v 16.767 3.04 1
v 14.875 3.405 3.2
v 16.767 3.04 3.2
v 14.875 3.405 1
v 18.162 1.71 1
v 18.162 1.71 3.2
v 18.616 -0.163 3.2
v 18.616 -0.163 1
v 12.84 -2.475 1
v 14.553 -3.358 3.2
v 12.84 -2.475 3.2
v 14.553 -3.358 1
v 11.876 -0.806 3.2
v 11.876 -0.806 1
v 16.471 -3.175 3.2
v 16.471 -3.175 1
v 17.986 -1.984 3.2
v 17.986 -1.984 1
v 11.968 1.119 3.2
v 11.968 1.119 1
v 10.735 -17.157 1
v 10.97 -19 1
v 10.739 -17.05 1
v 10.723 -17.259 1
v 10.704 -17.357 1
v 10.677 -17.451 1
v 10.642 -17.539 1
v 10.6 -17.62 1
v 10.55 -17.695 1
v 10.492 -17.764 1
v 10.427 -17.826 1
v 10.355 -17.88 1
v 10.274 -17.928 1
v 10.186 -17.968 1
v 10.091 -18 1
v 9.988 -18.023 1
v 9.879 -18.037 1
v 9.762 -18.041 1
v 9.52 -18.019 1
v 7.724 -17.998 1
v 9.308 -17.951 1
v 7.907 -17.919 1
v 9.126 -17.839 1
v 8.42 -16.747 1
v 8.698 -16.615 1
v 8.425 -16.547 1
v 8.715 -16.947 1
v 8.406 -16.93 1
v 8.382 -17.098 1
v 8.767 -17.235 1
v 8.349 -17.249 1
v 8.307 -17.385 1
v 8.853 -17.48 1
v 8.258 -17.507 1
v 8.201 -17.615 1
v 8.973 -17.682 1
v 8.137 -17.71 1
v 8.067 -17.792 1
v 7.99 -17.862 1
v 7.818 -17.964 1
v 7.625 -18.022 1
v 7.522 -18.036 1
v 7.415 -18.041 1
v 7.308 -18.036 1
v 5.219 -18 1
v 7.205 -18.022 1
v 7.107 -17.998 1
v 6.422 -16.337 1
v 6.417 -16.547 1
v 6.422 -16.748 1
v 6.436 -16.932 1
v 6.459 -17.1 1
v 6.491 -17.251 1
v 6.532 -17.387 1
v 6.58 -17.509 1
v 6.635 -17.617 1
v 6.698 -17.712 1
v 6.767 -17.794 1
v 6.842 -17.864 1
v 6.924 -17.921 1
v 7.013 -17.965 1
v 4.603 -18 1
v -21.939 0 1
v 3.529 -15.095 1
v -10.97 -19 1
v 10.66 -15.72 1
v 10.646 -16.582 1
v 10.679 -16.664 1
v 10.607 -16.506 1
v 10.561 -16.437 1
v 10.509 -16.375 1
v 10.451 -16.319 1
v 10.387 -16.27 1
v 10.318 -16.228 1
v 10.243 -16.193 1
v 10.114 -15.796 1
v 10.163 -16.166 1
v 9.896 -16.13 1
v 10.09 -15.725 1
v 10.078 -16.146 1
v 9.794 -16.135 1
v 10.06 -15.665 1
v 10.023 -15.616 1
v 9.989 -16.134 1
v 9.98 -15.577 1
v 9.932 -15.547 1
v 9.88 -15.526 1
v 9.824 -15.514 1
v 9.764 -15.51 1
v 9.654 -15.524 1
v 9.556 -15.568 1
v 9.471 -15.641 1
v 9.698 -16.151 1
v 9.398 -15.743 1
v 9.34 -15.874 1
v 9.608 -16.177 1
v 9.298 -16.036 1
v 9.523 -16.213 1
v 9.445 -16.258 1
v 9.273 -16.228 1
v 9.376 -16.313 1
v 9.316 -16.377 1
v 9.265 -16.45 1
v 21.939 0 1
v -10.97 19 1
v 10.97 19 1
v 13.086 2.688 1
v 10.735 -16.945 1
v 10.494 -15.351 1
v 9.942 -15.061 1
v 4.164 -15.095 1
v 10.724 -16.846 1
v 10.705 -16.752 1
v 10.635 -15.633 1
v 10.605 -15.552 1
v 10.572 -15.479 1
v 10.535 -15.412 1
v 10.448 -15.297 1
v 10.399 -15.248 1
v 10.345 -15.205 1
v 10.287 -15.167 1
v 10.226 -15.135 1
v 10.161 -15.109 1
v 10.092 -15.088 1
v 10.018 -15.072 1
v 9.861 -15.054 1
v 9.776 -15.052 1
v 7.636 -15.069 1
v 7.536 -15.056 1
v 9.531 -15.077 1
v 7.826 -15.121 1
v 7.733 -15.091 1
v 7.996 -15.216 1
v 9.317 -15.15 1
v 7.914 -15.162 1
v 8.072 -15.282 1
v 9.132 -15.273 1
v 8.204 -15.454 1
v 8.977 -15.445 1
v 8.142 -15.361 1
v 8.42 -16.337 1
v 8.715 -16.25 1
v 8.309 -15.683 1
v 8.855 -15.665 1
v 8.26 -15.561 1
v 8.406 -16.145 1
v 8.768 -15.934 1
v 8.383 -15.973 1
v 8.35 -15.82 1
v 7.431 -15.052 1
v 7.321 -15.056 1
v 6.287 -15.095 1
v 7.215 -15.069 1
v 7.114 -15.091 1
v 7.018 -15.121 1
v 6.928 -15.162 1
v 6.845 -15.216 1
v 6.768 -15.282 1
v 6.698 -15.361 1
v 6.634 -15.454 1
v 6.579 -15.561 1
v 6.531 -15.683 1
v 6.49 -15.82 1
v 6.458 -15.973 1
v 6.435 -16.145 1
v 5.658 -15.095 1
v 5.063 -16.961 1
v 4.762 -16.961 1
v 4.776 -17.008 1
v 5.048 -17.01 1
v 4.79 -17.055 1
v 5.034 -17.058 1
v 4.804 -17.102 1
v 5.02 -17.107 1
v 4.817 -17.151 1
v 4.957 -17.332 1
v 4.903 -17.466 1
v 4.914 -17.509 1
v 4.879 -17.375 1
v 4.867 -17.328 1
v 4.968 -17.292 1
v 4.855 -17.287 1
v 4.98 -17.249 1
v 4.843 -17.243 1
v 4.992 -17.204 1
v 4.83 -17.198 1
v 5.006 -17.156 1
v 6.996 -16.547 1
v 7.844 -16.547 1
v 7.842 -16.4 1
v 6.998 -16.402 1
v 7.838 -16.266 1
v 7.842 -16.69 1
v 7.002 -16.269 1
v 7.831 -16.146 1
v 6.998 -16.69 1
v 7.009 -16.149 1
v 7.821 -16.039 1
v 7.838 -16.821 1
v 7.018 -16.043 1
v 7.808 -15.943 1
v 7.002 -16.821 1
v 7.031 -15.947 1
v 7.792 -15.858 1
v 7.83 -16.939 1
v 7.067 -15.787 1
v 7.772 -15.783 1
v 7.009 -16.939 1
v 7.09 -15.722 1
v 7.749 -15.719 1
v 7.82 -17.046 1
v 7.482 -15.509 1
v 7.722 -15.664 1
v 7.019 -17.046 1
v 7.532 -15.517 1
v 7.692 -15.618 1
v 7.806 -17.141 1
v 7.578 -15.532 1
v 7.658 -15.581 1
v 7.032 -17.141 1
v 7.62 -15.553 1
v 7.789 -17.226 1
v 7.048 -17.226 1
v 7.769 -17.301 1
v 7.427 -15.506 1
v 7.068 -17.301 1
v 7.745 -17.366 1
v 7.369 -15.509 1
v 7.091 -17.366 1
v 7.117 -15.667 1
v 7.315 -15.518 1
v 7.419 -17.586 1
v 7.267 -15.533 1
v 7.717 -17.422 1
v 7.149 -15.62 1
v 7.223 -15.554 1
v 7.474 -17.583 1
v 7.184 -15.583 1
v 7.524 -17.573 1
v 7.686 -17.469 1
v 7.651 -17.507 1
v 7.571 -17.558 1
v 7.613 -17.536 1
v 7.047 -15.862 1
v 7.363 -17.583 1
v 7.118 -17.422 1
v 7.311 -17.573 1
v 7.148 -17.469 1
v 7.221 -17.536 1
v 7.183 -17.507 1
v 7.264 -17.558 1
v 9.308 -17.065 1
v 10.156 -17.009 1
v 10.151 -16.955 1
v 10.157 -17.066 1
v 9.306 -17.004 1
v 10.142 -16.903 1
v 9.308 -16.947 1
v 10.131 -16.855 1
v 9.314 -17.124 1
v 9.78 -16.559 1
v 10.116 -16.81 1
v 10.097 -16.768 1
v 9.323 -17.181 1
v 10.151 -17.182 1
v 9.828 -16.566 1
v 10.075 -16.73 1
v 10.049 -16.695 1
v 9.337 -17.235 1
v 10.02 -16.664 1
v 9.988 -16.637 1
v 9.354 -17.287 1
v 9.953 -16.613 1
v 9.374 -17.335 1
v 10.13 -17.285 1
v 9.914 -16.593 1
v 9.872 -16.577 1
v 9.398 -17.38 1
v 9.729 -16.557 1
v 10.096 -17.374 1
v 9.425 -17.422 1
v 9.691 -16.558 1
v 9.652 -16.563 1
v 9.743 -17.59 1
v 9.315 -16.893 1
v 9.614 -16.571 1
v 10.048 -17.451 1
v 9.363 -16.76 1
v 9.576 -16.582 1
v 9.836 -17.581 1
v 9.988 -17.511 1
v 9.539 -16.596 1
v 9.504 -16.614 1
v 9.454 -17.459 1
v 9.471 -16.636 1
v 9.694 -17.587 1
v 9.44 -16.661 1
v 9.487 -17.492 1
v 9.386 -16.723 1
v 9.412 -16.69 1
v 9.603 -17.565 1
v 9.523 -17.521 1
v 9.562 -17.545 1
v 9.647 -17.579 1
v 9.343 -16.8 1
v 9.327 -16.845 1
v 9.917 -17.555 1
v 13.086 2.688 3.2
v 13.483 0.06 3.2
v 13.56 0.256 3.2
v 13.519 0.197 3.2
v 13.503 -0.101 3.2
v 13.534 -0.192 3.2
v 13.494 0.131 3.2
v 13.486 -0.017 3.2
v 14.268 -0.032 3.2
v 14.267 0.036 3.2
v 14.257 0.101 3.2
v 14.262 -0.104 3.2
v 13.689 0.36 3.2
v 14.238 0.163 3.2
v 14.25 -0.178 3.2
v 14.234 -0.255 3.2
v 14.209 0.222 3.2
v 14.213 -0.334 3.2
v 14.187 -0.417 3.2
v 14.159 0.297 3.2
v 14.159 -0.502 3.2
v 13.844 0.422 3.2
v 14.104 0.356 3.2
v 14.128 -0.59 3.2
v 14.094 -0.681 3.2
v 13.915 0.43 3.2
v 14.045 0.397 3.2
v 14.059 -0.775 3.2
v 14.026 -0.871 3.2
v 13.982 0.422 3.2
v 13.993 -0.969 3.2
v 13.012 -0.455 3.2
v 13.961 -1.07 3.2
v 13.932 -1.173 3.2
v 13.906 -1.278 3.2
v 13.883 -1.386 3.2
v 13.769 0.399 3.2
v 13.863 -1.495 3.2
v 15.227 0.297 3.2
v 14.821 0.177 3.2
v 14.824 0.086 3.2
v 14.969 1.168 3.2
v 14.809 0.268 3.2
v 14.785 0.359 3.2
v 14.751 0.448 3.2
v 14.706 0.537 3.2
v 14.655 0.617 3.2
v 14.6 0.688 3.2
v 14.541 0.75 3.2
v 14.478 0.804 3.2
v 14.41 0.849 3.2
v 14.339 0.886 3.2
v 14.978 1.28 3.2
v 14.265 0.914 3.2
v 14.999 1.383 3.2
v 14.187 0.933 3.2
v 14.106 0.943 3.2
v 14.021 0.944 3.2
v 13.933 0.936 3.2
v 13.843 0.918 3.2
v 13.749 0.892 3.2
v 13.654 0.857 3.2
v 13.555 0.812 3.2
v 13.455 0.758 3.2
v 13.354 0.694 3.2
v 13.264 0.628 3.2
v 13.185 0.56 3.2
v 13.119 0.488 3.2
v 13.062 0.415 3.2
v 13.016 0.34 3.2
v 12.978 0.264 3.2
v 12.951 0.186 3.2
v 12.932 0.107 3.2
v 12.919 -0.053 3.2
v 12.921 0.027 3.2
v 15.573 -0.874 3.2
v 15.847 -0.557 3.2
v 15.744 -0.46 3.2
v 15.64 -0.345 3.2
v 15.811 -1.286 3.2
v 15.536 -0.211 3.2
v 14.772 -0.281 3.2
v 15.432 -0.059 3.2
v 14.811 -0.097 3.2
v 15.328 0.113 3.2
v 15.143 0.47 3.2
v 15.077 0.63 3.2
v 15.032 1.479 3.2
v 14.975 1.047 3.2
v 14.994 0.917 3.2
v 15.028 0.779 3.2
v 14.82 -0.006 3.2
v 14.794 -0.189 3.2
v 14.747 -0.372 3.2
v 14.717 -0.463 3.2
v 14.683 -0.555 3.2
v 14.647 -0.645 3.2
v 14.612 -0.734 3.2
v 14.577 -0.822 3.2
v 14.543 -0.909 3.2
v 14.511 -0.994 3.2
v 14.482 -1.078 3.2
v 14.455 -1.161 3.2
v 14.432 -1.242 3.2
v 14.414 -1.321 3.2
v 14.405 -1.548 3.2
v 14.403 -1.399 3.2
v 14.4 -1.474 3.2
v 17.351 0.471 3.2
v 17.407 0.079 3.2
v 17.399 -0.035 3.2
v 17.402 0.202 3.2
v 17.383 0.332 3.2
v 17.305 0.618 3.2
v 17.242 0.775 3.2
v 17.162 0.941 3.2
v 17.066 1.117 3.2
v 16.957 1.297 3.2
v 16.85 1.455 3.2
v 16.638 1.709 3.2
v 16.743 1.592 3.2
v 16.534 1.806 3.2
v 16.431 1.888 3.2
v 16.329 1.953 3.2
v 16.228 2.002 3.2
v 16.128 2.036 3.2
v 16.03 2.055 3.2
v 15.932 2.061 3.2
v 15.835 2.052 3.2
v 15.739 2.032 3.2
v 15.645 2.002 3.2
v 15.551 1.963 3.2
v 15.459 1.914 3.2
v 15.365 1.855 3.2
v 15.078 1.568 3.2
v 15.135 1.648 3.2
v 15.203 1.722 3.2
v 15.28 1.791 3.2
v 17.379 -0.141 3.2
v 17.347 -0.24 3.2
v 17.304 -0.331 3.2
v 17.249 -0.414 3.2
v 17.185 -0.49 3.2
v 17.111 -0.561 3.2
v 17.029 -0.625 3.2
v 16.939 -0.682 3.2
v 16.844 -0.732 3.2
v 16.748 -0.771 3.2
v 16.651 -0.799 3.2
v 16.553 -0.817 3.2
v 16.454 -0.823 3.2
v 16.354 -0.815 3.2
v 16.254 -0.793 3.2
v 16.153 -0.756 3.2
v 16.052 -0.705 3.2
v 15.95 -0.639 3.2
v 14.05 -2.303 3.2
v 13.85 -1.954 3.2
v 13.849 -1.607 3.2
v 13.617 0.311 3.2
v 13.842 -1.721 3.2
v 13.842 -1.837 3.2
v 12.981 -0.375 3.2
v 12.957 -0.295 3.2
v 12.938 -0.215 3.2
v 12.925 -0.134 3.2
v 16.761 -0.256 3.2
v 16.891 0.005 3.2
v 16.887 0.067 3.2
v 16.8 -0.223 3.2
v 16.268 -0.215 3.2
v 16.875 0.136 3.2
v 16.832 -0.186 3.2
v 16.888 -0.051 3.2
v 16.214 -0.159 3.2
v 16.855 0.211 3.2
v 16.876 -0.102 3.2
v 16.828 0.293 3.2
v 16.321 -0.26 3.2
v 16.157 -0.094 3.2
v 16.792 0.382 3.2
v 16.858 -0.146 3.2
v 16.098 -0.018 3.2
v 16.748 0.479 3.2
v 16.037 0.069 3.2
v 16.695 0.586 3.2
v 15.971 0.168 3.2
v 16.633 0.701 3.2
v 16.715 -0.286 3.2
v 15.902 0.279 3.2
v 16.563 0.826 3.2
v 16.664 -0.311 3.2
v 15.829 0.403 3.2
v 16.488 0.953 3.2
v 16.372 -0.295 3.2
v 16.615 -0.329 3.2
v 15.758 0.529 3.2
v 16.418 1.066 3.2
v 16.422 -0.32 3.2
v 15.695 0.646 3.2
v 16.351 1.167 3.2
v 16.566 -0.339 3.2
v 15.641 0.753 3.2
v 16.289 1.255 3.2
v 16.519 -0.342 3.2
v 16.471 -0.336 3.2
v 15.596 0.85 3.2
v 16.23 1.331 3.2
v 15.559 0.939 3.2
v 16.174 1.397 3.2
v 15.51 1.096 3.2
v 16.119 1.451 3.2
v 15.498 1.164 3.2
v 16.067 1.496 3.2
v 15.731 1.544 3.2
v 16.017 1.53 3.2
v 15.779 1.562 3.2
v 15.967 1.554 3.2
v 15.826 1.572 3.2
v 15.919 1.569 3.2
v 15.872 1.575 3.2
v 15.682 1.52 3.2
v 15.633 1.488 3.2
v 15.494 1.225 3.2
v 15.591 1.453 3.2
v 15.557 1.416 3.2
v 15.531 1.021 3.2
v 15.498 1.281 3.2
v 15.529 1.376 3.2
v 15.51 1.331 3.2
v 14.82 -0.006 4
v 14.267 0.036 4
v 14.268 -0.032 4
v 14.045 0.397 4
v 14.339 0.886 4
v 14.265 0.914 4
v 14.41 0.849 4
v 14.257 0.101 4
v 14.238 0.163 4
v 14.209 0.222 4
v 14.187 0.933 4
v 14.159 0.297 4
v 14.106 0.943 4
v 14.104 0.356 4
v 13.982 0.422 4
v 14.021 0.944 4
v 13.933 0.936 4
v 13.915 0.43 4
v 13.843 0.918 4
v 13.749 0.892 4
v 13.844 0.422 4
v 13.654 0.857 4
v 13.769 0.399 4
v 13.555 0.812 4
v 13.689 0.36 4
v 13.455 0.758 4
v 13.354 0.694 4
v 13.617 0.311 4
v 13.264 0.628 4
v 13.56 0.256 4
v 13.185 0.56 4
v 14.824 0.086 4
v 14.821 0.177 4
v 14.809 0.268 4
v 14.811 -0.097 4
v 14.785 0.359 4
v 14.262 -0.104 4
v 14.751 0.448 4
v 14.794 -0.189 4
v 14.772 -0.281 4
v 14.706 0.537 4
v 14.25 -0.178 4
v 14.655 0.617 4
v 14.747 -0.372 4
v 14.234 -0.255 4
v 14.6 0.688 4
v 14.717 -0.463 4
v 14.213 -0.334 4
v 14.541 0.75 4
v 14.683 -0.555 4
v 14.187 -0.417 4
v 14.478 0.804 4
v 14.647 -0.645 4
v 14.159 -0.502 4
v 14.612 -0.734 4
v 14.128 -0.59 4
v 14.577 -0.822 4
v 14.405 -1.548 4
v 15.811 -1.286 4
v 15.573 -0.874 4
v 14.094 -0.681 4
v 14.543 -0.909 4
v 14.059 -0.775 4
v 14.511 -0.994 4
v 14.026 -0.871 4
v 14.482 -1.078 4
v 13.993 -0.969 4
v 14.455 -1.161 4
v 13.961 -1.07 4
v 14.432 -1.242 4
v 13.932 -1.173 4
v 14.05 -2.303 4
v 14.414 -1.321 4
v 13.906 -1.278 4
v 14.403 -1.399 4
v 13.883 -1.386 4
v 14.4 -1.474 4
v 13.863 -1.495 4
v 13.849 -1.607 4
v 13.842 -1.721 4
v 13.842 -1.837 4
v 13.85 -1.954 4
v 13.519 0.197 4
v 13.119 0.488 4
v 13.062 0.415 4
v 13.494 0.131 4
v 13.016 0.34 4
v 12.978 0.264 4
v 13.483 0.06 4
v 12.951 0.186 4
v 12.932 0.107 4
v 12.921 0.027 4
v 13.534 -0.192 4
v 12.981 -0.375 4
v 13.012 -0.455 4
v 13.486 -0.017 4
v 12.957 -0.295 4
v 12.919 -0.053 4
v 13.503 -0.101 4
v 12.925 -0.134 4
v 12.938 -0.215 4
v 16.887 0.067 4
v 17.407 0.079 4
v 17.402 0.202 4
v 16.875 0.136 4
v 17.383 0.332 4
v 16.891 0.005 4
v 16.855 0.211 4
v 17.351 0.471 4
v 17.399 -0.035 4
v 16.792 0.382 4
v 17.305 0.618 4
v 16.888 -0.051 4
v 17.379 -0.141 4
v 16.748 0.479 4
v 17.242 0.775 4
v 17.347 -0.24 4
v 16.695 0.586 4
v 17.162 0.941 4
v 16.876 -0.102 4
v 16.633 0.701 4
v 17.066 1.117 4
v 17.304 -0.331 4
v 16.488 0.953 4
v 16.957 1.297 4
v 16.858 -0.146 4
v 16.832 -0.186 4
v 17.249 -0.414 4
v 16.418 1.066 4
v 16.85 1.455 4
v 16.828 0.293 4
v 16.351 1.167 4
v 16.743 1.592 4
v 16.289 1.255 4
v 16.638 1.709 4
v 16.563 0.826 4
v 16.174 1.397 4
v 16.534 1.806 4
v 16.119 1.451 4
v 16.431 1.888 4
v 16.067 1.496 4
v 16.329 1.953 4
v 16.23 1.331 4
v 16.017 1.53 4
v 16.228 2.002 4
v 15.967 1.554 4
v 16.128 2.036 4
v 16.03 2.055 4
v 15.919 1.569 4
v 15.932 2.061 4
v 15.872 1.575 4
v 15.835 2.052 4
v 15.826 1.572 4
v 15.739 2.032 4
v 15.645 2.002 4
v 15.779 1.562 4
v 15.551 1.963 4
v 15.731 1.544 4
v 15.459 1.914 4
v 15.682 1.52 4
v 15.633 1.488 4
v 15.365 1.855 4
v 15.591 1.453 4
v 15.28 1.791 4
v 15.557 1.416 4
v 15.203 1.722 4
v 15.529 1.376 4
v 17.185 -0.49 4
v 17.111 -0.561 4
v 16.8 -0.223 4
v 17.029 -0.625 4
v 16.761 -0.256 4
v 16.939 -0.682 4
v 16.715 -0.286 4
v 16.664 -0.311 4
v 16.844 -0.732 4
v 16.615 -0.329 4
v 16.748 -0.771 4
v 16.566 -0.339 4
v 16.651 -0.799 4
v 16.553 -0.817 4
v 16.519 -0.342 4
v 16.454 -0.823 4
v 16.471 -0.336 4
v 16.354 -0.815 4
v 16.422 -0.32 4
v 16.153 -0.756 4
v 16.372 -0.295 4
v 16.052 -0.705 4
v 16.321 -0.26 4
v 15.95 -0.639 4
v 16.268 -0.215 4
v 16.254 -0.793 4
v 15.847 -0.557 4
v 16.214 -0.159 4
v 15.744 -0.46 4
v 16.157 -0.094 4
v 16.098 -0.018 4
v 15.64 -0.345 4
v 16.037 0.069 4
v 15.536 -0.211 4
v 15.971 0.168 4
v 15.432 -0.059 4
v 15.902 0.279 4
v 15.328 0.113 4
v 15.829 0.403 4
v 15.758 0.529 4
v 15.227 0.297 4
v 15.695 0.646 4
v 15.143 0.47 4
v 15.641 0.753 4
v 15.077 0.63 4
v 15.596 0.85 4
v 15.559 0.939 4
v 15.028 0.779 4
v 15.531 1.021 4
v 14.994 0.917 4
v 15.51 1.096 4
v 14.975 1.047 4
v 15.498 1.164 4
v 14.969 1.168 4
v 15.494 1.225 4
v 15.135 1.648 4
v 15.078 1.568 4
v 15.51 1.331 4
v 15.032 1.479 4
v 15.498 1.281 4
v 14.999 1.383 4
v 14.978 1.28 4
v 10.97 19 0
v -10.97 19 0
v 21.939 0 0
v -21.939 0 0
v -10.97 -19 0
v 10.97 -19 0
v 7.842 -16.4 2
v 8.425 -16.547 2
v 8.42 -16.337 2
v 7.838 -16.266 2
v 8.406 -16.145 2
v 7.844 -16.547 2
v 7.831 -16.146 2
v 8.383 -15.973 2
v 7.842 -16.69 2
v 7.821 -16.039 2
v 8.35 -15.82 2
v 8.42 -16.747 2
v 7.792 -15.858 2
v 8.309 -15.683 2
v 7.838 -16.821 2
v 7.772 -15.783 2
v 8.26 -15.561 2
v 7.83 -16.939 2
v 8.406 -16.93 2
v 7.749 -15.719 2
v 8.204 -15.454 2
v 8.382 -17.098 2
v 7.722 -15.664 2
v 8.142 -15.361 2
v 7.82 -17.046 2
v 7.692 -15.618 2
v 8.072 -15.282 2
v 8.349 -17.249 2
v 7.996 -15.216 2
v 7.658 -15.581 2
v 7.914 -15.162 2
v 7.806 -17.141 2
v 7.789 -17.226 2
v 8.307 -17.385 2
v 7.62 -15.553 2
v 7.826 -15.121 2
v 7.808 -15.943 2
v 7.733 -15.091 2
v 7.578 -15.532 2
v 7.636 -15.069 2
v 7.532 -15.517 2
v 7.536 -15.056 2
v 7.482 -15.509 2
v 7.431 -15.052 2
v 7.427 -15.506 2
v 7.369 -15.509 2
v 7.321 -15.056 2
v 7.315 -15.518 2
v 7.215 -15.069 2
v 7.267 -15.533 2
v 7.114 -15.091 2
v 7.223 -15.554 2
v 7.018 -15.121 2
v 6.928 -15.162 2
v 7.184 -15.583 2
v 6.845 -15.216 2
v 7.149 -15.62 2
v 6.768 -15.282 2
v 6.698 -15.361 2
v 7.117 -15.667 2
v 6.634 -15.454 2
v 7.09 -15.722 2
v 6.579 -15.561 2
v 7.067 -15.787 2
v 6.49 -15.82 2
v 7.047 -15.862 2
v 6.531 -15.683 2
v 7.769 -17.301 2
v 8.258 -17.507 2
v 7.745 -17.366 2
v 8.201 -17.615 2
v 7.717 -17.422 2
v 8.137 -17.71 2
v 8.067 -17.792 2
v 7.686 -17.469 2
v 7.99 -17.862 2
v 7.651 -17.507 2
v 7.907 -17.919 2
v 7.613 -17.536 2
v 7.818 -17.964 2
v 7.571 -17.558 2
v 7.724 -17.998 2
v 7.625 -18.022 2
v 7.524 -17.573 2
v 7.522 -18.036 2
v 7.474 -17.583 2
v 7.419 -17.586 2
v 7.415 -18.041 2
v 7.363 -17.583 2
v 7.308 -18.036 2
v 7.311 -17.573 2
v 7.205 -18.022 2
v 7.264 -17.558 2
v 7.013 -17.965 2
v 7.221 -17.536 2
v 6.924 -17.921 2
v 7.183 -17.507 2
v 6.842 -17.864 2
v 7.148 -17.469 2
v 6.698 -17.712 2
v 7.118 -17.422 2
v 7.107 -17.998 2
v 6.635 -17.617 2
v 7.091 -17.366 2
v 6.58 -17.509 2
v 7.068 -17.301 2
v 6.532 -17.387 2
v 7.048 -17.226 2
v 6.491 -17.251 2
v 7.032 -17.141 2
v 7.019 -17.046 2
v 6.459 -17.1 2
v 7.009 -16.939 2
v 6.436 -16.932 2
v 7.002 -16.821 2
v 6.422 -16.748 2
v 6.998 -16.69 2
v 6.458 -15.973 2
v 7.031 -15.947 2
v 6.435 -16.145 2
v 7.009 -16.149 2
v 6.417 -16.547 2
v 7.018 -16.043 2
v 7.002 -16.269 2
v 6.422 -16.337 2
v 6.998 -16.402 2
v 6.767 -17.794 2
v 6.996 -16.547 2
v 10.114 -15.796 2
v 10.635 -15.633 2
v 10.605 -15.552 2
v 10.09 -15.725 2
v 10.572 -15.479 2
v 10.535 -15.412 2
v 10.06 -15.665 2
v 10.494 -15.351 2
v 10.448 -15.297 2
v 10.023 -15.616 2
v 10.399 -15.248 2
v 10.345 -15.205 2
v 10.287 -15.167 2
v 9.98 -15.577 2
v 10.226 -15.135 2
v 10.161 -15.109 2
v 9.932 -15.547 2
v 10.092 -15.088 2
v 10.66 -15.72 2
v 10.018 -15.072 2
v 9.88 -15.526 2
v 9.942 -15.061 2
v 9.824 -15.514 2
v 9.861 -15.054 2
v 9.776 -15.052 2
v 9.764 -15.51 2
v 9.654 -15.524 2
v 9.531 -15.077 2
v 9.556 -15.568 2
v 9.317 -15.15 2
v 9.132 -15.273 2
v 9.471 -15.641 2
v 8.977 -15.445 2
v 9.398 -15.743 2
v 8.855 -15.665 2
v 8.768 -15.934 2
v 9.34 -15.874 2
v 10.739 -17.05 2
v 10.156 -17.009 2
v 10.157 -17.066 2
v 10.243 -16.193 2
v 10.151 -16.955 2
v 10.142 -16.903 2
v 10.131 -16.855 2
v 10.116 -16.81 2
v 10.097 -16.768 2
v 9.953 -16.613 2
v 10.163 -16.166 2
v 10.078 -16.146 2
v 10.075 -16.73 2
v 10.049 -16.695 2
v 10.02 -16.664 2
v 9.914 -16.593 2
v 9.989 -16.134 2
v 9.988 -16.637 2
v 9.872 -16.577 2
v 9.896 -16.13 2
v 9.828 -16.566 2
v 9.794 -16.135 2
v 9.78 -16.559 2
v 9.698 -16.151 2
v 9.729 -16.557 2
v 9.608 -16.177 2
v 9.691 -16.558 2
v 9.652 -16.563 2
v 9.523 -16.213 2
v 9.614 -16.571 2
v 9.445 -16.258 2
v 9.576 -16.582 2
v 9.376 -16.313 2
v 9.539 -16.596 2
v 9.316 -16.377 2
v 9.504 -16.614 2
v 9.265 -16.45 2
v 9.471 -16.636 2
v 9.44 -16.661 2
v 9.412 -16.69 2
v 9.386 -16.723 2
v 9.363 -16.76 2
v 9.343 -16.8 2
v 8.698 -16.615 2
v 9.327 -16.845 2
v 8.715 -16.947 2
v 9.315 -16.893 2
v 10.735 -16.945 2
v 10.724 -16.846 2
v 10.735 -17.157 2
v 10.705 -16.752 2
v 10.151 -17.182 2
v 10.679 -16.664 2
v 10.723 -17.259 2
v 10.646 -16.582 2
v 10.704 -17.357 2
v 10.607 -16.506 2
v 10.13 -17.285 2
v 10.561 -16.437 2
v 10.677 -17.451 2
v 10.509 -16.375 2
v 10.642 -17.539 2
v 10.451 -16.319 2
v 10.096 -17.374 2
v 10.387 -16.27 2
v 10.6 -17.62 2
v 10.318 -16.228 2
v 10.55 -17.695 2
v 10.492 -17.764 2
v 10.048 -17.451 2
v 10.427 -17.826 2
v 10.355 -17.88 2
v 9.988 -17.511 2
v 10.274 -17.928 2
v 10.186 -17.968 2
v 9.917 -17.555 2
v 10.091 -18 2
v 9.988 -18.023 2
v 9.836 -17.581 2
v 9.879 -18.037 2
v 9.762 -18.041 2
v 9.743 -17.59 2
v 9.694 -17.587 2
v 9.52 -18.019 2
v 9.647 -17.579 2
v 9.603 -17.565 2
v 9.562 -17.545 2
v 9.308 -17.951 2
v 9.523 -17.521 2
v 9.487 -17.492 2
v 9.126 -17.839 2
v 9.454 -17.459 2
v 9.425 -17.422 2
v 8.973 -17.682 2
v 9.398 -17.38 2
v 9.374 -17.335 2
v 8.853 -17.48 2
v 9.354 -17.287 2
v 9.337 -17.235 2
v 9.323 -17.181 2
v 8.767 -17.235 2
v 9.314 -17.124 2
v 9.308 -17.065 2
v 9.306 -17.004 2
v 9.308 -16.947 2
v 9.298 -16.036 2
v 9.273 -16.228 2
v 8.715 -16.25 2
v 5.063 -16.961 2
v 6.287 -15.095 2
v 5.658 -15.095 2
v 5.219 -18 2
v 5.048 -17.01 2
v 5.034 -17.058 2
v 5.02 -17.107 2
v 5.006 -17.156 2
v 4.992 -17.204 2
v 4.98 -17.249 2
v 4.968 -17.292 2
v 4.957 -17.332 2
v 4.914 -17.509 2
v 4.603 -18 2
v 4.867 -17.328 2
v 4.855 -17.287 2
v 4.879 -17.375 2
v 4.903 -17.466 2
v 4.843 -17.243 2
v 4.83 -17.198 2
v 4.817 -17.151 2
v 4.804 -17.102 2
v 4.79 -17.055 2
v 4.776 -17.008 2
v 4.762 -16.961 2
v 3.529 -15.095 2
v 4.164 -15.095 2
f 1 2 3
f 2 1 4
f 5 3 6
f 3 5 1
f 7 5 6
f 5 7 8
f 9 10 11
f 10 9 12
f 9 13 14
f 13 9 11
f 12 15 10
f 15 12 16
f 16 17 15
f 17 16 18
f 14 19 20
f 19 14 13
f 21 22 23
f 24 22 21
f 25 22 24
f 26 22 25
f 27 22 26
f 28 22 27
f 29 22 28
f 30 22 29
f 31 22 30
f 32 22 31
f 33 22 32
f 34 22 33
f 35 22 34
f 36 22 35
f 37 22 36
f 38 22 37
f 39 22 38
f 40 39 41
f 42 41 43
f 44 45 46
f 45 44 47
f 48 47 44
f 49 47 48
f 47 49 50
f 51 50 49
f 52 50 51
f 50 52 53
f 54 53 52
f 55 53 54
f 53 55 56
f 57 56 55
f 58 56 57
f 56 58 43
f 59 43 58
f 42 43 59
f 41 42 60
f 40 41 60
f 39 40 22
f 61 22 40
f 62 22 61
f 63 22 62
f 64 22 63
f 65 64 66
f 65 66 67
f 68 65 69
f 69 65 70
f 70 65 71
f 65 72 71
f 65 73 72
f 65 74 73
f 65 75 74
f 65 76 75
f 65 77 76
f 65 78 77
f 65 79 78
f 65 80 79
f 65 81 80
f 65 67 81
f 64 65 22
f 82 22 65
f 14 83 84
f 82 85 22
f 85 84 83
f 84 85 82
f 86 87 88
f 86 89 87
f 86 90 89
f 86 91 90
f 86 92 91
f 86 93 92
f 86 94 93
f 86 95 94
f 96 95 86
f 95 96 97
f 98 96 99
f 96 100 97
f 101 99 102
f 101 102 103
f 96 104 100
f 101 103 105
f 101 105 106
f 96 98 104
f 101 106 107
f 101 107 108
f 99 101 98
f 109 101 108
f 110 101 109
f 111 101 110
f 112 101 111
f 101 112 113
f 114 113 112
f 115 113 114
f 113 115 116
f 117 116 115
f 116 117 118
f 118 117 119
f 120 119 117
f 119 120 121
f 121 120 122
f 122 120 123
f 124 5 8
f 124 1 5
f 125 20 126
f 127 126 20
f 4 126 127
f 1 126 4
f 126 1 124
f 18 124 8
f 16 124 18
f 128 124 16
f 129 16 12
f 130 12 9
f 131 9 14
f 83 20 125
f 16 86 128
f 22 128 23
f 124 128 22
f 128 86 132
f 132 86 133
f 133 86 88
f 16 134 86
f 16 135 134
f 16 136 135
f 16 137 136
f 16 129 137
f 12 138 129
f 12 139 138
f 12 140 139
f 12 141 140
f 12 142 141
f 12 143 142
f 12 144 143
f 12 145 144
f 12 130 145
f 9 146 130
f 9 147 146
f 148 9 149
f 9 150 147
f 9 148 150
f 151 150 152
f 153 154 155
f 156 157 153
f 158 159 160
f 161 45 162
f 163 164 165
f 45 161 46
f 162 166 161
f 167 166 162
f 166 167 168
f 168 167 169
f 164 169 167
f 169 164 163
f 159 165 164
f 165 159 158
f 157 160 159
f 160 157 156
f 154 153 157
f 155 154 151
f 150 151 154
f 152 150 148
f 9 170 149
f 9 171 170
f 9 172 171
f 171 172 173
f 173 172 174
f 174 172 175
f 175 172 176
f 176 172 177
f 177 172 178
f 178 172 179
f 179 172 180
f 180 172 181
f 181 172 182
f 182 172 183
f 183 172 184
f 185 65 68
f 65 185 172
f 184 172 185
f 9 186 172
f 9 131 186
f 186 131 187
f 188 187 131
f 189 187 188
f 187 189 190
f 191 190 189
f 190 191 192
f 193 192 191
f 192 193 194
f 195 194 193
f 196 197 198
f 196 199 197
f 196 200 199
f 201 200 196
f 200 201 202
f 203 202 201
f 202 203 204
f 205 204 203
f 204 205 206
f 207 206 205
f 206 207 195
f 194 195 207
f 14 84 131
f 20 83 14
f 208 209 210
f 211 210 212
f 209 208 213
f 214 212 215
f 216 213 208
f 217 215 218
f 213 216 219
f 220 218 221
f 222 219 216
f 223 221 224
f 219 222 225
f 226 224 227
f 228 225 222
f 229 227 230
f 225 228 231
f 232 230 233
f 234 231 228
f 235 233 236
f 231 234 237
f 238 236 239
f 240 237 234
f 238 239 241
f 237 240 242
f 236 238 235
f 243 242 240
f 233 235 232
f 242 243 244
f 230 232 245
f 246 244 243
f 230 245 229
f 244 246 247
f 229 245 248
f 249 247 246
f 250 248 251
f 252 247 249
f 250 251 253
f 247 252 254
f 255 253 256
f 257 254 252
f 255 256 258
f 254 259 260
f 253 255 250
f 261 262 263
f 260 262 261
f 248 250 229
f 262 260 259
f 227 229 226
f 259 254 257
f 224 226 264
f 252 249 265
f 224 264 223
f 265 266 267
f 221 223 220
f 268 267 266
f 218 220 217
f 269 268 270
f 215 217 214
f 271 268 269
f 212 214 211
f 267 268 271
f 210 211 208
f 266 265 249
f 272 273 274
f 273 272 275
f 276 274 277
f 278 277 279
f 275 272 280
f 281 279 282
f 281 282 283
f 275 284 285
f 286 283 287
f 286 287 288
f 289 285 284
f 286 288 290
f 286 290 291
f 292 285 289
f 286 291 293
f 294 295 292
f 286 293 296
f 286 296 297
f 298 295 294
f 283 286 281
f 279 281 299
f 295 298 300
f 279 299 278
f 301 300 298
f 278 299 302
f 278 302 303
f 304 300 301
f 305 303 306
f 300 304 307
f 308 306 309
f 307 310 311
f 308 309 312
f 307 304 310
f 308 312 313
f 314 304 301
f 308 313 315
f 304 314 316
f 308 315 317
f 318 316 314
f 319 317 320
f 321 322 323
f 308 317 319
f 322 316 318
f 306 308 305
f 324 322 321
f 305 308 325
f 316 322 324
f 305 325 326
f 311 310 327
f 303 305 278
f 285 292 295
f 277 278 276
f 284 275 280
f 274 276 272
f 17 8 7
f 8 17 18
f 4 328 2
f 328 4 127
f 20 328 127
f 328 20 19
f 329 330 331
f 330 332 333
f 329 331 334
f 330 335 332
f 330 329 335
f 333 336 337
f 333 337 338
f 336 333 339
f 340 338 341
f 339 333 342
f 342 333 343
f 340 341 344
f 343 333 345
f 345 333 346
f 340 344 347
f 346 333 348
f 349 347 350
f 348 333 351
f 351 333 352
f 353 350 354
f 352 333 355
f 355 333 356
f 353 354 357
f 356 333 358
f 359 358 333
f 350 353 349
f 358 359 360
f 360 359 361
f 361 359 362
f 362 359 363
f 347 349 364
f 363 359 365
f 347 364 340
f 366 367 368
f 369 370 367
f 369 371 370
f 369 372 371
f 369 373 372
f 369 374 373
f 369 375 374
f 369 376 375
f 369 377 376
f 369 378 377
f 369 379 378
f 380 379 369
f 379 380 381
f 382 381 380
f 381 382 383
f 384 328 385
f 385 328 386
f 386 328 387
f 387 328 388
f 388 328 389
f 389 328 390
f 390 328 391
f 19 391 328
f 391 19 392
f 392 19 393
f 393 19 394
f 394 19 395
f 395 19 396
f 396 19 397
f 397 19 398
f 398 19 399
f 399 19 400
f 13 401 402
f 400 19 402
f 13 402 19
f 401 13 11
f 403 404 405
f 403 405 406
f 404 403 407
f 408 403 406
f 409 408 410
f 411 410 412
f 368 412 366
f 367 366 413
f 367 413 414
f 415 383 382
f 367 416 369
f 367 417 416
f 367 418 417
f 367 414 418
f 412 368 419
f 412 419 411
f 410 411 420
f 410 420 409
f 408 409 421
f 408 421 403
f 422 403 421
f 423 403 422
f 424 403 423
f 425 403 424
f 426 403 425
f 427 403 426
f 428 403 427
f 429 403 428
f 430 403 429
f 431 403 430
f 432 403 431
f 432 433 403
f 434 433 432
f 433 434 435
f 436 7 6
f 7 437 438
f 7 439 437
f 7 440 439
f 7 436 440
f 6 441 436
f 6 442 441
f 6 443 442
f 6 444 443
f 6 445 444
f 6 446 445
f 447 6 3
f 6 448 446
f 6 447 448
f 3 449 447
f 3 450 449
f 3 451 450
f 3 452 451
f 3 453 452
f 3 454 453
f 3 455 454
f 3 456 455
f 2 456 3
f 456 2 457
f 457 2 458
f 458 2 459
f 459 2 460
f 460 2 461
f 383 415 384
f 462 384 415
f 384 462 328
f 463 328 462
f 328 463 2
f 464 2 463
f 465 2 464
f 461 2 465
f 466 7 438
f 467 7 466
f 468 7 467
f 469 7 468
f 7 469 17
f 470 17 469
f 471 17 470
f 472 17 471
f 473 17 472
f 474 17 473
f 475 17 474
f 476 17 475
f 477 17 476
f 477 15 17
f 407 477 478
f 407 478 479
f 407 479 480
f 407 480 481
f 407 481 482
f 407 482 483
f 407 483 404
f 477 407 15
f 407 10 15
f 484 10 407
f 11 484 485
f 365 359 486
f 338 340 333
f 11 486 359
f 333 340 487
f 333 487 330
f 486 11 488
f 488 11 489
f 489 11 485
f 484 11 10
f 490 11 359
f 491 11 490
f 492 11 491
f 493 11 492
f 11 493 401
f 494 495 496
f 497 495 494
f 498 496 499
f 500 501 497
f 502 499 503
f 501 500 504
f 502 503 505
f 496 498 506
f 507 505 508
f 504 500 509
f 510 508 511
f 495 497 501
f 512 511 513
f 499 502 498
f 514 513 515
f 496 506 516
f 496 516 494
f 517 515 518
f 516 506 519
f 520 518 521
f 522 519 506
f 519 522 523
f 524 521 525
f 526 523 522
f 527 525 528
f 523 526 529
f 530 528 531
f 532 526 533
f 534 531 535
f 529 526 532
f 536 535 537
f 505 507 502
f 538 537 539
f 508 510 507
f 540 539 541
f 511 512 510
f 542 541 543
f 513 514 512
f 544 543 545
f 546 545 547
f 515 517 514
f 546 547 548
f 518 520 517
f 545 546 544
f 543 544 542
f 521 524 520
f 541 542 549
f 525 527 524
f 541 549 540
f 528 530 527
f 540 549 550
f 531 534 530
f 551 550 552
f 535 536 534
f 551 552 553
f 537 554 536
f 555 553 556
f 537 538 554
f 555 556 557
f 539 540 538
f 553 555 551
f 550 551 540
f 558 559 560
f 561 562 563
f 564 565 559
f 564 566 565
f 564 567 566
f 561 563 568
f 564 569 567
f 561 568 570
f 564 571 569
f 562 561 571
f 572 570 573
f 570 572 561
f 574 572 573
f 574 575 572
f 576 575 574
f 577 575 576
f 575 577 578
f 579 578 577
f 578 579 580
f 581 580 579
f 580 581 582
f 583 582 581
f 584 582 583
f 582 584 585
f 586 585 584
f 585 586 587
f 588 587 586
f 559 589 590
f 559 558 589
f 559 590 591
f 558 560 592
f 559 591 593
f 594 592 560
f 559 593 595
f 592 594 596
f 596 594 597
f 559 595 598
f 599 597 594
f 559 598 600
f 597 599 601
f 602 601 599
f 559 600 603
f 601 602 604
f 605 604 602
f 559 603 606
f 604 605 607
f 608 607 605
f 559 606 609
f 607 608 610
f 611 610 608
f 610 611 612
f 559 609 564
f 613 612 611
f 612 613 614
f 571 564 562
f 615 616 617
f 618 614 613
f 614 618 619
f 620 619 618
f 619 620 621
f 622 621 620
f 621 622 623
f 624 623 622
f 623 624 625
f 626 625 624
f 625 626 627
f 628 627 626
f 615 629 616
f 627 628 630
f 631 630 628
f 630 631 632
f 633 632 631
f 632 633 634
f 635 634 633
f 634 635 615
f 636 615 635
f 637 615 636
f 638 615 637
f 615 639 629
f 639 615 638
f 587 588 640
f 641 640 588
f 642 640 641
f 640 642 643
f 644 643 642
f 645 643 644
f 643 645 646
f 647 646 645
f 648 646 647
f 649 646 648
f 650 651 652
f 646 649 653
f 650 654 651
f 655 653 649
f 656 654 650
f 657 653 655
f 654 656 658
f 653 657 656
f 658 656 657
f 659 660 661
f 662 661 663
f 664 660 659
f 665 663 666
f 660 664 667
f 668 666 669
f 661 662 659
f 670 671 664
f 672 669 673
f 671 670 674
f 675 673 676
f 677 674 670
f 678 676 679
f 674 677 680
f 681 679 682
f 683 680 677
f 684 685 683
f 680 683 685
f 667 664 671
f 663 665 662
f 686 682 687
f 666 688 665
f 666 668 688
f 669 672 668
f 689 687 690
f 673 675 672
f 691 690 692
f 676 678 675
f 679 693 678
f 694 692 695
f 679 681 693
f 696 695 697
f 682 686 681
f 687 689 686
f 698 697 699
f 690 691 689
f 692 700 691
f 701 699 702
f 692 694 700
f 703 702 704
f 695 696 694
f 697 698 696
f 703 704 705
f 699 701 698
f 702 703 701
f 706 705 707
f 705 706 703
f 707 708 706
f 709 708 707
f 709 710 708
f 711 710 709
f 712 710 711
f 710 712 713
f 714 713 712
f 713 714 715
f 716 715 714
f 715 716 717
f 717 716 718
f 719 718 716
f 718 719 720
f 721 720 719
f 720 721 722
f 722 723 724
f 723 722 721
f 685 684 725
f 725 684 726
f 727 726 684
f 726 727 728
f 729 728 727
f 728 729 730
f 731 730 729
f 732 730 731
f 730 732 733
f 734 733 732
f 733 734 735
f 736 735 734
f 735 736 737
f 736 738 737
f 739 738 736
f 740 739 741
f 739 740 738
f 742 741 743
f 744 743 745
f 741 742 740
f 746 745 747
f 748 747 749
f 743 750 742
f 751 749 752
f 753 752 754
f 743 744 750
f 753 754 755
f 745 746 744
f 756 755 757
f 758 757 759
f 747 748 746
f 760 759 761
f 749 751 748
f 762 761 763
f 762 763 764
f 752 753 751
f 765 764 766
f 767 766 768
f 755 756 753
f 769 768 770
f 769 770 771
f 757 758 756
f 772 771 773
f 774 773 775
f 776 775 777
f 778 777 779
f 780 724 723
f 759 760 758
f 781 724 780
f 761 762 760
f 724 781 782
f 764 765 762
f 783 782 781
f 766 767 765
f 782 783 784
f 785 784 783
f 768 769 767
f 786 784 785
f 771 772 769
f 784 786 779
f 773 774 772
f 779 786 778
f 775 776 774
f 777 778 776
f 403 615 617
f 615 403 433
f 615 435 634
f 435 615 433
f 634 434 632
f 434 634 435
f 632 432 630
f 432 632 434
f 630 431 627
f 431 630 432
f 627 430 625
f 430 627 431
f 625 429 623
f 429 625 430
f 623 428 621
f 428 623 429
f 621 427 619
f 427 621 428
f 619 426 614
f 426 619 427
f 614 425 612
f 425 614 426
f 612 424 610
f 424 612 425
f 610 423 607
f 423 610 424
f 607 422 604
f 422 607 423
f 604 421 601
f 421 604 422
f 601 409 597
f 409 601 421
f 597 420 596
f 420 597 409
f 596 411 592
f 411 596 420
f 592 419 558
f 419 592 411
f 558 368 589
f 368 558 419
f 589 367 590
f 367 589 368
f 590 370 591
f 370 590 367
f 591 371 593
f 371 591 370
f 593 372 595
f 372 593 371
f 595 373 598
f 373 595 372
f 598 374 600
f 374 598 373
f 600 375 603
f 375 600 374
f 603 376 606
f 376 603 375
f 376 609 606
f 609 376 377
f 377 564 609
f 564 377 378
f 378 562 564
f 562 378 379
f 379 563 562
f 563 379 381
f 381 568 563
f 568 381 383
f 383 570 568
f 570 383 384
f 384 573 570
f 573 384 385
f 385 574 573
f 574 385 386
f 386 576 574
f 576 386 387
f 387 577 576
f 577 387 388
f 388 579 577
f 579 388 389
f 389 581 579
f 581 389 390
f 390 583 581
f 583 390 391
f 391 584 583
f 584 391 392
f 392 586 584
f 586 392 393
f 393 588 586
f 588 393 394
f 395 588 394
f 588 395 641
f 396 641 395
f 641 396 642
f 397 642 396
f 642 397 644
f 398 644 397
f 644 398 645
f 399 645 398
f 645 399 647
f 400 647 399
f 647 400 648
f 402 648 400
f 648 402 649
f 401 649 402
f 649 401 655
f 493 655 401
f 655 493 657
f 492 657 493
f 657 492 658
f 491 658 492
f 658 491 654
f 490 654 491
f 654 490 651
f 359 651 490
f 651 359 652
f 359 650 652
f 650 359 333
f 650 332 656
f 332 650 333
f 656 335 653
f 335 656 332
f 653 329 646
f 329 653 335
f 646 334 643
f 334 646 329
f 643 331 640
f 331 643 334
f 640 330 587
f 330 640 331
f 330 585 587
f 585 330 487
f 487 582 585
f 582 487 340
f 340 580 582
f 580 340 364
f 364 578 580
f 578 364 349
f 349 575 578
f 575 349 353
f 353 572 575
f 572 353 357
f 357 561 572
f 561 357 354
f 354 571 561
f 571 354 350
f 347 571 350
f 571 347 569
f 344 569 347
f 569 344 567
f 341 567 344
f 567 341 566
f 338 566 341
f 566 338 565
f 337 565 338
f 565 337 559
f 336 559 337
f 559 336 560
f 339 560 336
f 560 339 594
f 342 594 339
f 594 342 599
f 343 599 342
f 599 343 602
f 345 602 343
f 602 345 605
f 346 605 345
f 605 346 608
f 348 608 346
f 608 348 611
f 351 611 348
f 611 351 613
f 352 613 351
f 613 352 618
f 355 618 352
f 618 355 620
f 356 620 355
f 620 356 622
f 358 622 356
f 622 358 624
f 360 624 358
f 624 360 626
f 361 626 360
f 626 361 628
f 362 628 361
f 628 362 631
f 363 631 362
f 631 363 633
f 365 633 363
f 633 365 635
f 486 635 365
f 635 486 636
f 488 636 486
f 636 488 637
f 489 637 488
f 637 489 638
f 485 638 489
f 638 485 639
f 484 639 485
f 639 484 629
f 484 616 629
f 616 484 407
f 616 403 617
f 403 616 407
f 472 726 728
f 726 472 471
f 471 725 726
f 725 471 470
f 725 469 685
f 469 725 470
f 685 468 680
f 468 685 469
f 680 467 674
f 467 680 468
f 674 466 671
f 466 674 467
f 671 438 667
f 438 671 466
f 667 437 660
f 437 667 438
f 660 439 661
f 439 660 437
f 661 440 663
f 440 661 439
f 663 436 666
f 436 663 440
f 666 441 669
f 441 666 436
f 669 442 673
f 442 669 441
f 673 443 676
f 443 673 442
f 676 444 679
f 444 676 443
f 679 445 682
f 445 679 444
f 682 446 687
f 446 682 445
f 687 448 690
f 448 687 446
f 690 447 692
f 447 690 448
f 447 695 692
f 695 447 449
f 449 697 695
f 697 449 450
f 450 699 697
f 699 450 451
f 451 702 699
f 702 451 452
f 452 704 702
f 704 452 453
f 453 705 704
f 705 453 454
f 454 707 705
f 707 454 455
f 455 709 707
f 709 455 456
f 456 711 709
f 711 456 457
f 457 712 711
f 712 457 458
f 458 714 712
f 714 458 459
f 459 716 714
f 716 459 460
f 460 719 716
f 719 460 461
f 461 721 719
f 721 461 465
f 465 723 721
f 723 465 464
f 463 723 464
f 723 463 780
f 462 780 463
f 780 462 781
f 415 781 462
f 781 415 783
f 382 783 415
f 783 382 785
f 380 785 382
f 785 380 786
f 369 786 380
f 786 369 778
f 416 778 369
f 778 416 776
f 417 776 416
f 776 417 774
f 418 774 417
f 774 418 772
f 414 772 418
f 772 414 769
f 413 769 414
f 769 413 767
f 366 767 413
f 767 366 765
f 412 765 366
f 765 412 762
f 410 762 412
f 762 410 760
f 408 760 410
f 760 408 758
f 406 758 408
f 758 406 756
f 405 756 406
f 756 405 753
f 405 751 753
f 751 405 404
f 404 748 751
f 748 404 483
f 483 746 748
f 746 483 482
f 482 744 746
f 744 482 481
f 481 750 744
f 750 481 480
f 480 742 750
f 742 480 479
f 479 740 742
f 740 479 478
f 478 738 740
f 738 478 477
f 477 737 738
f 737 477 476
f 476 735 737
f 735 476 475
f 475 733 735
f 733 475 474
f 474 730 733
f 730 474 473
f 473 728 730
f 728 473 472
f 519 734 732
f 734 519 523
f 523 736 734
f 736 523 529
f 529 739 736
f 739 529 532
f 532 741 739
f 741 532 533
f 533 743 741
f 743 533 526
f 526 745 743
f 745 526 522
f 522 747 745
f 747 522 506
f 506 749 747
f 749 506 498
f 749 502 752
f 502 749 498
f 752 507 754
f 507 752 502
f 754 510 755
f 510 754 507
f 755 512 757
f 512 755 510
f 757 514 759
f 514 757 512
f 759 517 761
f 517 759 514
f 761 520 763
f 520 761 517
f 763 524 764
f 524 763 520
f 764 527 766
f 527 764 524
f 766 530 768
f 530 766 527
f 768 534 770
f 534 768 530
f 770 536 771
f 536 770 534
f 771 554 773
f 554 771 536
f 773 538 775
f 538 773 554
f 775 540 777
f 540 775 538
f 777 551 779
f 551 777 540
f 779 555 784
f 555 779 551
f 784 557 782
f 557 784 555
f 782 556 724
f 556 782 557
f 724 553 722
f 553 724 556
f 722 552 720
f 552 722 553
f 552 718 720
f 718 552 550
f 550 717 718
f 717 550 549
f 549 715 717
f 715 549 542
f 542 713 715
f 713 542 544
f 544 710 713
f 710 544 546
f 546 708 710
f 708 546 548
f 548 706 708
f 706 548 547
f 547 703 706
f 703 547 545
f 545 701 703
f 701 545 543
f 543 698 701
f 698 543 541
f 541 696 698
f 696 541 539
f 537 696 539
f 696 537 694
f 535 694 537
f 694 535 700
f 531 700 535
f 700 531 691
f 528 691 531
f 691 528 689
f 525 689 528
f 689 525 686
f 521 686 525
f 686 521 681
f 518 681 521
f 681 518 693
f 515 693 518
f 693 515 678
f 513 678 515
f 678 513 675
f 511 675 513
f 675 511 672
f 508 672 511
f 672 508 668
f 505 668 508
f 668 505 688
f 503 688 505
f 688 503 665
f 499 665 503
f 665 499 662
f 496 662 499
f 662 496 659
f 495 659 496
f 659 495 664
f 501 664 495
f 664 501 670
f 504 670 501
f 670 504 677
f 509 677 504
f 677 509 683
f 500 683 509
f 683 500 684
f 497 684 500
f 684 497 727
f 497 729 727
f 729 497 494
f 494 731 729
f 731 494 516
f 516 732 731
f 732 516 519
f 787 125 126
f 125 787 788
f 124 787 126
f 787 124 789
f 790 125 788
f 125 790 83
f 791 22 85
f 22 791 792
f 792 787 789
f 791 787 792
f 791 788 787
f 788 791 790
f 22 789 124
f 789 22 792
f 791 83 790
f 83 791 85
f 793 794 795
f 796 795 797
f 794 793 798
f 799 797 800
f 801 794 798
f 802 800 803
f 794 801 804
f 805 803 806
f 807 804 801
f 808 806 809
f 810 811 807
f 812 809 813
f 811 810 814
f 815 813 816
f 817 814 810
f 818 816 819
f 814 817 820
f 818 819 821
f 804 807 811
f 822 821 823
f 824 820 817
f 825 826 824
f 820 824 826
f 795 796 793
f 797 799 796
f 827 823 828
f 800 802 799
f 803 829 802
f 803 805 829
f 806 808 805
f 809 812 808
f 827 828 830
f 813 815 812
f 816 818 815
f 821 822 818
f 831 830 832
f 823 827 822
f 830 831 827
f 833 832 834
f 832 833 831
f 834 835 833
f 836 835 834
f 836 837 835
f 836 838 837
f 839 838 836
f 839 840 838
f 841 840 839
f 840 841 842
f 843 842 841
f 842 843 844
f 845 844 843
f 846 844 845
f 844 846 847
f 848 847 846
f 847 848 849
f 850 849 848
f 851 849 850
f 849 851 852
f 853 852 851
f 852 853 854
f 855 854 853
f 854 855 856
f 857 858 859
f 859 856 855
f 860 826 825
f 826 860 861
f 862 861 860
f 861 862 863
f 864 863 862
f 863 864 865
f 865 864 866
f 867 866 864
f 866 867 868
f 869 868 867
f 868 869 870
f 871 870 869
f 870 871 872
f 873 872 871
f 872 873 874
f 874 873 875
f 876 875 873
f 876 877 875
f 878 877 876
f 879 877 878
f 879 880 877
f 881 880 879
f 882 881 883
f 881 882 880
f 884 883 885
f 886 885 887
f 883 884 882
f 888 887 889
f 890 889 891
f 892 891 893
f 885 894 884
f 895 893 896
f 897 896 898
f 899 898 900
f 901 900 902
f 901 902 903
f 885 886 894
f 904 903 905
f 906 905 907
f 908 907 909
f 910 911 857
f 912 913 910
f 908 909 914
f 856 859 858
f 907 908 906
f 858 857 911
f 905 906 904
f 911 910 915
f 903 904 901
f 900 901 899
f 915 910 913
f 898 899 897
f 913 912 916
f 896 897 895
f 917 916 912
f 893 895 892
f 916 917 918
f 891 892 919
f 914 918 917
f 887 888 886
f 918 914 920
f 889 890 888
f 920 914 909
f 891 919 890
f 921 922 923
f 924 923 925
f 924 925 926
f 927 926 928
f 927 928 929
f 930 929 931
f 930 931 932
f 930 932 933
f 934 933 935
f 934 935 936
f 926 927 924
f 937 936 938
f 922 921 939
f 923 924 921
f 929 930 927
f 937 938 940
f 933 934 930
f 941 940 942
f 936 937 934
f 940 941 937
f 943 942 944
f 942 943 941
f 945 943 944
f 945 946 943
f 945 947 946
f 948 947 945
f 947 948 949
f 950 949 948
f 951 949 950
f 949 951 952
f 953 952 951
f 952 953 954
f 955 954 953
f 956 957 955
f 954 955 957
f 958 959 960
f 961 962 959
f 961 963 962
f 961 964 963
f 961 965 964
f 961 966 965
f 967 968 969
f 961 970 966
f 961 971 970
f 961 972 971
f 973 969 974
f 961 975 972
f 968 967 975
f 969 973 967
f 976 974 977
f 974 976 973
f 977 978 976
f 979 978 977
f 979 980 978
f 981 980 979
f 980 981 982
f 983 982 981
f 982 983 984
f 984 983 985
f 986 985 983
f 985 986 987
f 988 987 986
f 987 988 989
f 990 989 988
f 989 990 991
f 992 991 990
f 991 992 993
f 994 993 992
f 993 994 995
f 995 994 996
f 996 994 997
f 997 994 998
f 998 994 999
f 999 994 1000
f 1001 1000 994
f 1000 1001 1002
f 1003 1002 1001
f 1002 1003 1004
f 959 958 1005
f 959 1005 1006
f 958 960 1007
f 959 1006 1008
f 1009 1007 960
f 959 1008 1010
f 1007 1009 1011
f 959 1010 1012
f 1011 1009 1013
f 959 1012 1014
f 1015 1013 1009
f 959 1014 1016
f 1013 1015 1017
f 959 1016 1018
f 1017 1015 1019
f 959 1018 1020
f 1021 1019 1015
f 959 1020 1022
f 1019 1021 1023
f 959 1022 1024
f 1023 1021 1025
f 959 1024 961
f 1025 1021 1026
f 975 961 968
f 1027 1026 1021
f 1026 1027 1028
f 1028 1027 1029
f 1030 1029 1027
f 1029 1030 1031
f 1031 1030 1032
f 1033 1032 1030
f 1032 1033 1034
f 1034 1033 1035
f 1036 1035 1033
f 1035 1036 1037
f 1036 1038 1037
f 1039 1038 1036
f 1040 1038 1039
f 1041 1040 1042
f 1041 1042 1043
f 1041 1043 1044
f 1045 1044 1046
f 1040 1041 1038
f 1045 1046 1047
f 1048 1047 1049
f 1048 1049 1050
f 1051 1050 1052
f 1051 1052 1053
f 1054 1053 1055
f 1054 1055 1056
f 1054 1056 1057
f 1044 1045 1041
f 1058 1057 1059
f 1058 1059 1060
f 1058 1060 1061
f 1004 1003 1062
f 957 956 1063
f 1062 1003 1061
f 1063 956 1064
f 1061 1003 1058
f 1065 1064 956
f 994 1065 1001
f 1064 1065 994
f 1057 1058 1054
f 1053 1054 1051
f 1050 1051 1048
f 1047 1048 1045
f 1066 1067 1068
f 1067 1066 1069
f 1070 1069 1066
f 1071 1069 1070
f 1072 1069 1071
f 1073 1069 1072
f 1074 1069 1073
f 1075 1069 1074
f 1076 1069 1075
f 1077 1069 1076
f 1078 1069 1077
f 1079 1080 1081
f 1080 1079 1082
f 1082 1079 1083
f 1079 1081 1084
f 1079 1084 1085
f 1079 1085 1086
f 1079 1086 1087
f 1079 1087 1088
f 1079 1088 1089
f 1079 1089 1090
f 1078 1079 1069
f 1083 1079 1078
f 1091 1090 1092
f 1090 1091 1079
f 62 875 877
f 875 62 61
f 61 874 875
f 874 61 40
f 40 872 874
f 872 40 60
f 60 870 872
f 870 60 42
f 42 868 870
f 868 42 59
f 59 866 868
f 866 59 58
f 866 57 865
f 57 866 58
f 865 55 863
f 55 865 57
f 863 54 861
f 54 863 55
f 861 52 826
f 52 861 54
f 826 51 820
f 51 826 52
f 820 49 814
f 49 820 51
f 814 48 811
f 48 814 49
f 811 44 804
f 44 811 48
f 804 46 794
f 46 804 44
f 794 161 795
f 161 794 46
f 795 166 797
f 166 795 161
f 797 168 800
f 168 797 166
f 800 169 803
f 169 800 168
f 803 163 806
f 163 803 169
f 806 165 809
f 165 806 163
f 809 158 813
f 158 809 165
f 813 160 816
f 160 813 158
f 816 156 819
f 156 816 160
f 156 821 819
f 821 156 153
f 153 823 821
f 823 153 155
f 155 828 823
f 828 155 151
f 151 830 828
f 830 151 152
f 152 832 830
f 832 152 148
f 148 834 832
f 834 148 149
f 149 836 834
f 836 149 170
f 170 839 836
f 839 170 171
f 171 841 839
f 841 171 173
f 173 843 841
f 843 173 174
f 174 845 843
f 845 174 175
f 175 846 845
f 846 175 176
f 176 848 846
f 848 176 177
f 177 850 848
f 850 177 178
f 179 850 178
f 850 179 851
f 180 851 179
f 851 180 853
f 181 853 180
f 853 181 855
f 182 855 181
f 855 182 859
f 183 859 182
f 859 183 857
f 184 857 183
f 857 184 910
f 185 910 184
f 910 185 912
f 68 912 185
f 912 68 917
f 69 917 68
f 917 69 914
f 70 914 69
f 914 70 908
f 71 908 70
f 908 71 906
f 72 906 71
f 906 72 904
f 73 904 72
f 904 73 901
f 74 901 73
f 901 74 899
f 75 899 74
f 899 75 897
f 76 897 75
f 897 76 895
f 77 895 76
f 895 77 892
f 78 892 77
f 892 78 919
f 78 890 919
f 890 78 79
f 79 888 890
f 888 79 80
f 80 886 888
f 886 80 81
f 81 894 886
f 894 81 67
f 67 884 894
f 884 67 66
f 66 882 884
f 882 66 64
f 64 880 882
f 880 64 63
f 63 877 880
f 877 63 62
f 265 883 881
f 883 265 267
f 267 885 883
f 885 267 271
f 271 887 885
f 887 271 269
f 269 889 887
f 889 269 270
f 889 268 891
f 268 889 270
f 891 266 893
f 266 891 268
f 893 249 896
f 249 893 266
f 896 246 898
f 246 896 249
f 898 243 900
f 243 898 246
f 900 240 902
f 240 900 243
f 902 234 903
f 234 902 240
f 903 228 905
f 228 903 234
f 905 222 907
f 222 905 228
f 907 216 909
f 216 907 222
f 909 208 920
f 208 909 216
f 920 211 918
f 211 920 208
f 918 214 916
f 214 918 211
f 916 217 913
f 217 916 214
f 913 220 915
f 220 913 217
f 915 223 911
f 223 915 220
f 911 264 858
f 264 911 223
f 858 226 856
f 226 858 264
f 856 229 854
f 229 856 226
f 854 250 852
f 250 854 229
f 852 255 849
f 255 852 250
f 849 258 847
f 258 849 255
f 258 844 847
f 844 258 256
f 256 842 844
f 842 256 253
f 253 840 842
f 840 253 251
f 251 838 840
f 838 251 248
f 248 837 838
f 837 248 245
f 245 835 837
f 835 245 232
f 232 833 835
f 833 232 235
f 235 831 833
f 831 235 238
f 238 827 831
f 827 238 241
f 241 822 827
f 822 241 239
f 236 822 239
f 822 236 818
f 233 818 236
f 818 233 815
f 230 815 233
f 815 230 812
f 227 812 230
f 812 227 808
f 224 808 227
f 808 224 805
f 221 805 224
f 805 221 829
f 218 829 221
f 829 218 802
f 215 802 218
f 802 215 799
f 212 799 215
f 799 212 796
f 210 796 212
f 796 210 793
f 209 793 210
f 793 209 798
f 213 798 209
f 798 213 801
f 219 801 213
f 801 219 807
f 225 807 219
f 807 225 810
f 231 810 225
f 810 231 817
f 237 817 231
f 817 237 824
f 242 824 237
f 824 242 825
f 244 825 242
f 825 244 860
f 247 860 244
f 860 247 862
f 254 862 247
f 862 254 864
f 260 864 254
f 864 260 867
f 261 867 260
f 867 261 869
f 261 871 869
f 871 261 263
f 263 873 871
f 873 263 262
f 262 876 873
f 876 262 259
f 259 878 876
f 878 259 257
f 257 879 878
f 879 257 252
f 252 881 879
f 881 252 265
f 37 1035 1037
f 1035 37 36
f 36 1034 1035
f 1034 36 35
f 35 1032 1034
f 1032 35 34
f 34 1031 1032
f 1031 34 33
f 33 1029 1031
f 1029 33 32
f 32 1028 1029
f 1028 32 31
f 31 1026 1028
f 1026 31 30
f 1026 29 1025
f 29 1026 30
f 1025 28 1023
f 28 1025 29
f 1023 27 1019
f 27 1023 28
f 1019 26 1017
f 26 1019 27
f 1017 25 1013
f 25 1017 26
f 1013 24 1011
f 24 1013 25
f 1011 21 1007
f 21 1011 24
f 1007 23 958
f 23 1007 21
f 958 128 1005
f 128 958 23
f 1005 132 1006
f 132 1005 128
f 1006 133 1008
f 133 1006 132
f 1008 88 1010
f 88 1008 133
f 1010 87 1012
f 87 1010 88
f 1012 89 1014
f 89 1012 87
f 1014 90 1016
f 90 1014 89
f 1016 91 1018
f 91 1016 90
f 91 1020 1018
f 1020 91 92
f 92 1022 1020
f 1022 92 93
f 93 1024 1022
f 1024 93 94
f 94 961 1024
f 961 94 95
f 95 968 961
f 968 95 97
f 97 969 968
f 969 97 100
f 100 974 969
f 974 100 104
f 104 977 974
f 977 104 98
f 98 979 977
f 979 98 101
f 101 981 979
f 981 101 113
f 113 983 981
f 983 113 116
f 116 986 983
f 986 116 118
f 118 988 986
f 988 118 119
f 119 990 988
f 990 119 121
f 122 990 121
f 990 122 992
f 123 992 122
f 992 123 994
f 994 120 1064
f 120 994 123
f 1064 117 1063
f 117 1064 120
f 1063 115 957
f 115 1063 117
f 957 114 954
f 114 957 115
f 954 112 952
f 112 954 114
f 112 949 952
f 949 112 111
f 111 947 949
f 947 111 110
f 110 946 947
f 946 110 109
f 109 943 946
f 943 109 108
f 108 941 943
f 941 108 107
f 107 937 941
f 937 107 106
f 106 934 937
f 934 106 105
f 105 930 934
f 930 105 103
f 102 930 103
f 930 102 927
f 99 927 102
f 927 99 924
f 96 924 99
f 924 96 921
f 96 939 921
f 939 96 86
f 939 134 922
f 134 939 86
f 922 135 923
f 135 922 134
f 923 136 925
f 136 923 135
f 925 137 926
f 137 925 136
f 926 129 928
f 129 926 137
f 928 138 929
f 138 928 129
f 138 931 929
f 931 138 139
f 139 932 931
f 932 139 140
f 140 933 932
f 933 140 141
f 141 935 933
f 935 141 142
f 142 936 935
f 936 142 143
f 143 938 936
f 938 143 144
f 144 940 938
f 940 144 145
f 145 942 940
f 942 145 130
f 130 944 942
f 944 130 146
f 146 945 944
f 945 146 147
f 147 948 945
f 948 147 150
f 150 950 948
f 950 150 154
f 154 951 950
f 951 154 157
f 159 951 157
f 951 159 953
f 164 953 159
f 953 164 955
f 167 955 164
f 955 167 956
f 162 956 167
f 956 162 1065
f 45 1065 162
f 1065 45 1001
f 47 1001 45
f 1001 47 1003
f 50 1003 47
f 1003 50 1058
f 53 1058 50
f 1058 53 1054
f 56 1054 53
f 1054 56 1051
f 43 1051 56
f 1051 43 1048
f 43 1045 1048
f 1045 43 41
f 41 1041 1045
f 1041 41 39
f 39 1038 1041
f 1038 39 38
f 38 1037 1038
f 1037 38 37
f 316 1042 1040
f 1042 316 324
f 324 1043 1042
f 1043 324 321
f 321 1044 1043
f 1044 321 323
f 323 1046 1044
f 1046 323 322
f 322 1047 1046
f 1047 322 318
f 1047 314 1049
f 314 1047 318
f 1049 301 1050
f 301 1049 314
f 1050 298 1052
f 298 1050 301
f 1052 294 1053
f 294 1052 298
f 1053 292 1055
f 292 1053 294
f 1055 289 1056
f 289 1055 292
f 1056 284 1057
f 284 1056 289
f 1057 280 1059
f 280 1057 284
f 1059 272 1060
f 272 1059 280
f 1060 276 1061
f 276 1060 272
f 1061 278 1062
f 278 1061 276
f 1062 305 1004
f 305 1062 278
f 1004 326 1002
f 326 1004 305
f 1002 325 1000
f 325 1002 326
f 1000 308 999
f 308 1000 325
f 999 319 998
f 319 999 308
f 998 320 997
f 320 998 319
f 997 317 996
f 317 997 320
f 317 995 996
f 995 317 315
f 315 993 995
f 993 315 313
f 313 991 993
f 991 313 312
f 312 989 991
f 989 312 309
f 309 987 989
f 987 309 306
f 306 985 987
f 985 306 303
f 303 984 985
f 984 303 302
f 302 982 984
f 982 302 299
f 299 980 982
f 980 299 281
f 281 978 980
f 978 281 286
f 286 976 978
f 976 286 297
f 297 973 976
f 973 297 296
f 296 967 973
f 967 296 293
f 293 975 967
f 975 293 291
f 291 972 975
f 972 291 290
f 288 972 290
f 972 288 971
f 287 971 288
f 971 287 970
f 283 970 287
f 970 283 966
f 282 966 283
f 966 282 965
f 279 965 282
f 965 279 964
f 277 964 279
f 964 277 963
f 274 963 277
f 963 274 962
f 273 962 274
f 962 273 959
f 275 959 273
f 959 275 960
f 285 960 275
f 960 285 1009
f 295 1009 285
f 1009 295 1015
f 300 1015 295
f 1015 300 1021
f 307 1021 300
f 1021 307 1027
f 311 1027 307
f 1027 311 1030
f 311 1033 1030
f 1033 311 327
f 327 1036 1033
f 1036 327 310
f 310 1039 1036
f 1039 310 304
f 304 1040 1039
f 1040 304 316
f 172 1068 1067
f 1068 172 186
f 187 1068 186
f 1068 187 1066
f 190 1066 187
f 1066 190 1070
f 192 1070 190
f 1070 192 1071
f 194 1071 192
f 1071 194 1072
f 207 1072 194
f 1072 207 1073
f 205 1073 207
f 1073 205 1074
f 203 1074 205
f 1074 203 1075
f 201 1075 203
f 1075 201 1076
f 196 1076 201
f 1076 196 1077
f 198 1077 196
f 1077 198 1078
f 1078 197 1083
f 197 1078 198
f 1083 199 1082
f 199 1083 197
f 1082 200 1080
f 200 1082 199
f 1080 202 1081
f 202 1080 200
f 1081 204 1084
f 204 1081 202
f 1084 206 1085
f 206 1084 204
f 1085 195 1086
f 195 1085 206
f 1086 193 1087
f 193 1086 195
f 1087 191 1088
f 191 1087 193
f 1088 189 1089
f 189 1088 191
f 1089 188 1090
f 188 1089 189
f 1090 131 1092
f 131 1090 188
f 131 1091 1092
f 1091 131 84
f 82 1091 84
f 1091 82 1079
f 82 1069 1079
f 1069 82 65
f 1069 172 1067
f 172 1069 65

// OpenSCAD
include <../../Scripts/18xx tiles basic functions.scad>
hex("blue");
put_tilenr("V06");

put_value_blue("20",90);
